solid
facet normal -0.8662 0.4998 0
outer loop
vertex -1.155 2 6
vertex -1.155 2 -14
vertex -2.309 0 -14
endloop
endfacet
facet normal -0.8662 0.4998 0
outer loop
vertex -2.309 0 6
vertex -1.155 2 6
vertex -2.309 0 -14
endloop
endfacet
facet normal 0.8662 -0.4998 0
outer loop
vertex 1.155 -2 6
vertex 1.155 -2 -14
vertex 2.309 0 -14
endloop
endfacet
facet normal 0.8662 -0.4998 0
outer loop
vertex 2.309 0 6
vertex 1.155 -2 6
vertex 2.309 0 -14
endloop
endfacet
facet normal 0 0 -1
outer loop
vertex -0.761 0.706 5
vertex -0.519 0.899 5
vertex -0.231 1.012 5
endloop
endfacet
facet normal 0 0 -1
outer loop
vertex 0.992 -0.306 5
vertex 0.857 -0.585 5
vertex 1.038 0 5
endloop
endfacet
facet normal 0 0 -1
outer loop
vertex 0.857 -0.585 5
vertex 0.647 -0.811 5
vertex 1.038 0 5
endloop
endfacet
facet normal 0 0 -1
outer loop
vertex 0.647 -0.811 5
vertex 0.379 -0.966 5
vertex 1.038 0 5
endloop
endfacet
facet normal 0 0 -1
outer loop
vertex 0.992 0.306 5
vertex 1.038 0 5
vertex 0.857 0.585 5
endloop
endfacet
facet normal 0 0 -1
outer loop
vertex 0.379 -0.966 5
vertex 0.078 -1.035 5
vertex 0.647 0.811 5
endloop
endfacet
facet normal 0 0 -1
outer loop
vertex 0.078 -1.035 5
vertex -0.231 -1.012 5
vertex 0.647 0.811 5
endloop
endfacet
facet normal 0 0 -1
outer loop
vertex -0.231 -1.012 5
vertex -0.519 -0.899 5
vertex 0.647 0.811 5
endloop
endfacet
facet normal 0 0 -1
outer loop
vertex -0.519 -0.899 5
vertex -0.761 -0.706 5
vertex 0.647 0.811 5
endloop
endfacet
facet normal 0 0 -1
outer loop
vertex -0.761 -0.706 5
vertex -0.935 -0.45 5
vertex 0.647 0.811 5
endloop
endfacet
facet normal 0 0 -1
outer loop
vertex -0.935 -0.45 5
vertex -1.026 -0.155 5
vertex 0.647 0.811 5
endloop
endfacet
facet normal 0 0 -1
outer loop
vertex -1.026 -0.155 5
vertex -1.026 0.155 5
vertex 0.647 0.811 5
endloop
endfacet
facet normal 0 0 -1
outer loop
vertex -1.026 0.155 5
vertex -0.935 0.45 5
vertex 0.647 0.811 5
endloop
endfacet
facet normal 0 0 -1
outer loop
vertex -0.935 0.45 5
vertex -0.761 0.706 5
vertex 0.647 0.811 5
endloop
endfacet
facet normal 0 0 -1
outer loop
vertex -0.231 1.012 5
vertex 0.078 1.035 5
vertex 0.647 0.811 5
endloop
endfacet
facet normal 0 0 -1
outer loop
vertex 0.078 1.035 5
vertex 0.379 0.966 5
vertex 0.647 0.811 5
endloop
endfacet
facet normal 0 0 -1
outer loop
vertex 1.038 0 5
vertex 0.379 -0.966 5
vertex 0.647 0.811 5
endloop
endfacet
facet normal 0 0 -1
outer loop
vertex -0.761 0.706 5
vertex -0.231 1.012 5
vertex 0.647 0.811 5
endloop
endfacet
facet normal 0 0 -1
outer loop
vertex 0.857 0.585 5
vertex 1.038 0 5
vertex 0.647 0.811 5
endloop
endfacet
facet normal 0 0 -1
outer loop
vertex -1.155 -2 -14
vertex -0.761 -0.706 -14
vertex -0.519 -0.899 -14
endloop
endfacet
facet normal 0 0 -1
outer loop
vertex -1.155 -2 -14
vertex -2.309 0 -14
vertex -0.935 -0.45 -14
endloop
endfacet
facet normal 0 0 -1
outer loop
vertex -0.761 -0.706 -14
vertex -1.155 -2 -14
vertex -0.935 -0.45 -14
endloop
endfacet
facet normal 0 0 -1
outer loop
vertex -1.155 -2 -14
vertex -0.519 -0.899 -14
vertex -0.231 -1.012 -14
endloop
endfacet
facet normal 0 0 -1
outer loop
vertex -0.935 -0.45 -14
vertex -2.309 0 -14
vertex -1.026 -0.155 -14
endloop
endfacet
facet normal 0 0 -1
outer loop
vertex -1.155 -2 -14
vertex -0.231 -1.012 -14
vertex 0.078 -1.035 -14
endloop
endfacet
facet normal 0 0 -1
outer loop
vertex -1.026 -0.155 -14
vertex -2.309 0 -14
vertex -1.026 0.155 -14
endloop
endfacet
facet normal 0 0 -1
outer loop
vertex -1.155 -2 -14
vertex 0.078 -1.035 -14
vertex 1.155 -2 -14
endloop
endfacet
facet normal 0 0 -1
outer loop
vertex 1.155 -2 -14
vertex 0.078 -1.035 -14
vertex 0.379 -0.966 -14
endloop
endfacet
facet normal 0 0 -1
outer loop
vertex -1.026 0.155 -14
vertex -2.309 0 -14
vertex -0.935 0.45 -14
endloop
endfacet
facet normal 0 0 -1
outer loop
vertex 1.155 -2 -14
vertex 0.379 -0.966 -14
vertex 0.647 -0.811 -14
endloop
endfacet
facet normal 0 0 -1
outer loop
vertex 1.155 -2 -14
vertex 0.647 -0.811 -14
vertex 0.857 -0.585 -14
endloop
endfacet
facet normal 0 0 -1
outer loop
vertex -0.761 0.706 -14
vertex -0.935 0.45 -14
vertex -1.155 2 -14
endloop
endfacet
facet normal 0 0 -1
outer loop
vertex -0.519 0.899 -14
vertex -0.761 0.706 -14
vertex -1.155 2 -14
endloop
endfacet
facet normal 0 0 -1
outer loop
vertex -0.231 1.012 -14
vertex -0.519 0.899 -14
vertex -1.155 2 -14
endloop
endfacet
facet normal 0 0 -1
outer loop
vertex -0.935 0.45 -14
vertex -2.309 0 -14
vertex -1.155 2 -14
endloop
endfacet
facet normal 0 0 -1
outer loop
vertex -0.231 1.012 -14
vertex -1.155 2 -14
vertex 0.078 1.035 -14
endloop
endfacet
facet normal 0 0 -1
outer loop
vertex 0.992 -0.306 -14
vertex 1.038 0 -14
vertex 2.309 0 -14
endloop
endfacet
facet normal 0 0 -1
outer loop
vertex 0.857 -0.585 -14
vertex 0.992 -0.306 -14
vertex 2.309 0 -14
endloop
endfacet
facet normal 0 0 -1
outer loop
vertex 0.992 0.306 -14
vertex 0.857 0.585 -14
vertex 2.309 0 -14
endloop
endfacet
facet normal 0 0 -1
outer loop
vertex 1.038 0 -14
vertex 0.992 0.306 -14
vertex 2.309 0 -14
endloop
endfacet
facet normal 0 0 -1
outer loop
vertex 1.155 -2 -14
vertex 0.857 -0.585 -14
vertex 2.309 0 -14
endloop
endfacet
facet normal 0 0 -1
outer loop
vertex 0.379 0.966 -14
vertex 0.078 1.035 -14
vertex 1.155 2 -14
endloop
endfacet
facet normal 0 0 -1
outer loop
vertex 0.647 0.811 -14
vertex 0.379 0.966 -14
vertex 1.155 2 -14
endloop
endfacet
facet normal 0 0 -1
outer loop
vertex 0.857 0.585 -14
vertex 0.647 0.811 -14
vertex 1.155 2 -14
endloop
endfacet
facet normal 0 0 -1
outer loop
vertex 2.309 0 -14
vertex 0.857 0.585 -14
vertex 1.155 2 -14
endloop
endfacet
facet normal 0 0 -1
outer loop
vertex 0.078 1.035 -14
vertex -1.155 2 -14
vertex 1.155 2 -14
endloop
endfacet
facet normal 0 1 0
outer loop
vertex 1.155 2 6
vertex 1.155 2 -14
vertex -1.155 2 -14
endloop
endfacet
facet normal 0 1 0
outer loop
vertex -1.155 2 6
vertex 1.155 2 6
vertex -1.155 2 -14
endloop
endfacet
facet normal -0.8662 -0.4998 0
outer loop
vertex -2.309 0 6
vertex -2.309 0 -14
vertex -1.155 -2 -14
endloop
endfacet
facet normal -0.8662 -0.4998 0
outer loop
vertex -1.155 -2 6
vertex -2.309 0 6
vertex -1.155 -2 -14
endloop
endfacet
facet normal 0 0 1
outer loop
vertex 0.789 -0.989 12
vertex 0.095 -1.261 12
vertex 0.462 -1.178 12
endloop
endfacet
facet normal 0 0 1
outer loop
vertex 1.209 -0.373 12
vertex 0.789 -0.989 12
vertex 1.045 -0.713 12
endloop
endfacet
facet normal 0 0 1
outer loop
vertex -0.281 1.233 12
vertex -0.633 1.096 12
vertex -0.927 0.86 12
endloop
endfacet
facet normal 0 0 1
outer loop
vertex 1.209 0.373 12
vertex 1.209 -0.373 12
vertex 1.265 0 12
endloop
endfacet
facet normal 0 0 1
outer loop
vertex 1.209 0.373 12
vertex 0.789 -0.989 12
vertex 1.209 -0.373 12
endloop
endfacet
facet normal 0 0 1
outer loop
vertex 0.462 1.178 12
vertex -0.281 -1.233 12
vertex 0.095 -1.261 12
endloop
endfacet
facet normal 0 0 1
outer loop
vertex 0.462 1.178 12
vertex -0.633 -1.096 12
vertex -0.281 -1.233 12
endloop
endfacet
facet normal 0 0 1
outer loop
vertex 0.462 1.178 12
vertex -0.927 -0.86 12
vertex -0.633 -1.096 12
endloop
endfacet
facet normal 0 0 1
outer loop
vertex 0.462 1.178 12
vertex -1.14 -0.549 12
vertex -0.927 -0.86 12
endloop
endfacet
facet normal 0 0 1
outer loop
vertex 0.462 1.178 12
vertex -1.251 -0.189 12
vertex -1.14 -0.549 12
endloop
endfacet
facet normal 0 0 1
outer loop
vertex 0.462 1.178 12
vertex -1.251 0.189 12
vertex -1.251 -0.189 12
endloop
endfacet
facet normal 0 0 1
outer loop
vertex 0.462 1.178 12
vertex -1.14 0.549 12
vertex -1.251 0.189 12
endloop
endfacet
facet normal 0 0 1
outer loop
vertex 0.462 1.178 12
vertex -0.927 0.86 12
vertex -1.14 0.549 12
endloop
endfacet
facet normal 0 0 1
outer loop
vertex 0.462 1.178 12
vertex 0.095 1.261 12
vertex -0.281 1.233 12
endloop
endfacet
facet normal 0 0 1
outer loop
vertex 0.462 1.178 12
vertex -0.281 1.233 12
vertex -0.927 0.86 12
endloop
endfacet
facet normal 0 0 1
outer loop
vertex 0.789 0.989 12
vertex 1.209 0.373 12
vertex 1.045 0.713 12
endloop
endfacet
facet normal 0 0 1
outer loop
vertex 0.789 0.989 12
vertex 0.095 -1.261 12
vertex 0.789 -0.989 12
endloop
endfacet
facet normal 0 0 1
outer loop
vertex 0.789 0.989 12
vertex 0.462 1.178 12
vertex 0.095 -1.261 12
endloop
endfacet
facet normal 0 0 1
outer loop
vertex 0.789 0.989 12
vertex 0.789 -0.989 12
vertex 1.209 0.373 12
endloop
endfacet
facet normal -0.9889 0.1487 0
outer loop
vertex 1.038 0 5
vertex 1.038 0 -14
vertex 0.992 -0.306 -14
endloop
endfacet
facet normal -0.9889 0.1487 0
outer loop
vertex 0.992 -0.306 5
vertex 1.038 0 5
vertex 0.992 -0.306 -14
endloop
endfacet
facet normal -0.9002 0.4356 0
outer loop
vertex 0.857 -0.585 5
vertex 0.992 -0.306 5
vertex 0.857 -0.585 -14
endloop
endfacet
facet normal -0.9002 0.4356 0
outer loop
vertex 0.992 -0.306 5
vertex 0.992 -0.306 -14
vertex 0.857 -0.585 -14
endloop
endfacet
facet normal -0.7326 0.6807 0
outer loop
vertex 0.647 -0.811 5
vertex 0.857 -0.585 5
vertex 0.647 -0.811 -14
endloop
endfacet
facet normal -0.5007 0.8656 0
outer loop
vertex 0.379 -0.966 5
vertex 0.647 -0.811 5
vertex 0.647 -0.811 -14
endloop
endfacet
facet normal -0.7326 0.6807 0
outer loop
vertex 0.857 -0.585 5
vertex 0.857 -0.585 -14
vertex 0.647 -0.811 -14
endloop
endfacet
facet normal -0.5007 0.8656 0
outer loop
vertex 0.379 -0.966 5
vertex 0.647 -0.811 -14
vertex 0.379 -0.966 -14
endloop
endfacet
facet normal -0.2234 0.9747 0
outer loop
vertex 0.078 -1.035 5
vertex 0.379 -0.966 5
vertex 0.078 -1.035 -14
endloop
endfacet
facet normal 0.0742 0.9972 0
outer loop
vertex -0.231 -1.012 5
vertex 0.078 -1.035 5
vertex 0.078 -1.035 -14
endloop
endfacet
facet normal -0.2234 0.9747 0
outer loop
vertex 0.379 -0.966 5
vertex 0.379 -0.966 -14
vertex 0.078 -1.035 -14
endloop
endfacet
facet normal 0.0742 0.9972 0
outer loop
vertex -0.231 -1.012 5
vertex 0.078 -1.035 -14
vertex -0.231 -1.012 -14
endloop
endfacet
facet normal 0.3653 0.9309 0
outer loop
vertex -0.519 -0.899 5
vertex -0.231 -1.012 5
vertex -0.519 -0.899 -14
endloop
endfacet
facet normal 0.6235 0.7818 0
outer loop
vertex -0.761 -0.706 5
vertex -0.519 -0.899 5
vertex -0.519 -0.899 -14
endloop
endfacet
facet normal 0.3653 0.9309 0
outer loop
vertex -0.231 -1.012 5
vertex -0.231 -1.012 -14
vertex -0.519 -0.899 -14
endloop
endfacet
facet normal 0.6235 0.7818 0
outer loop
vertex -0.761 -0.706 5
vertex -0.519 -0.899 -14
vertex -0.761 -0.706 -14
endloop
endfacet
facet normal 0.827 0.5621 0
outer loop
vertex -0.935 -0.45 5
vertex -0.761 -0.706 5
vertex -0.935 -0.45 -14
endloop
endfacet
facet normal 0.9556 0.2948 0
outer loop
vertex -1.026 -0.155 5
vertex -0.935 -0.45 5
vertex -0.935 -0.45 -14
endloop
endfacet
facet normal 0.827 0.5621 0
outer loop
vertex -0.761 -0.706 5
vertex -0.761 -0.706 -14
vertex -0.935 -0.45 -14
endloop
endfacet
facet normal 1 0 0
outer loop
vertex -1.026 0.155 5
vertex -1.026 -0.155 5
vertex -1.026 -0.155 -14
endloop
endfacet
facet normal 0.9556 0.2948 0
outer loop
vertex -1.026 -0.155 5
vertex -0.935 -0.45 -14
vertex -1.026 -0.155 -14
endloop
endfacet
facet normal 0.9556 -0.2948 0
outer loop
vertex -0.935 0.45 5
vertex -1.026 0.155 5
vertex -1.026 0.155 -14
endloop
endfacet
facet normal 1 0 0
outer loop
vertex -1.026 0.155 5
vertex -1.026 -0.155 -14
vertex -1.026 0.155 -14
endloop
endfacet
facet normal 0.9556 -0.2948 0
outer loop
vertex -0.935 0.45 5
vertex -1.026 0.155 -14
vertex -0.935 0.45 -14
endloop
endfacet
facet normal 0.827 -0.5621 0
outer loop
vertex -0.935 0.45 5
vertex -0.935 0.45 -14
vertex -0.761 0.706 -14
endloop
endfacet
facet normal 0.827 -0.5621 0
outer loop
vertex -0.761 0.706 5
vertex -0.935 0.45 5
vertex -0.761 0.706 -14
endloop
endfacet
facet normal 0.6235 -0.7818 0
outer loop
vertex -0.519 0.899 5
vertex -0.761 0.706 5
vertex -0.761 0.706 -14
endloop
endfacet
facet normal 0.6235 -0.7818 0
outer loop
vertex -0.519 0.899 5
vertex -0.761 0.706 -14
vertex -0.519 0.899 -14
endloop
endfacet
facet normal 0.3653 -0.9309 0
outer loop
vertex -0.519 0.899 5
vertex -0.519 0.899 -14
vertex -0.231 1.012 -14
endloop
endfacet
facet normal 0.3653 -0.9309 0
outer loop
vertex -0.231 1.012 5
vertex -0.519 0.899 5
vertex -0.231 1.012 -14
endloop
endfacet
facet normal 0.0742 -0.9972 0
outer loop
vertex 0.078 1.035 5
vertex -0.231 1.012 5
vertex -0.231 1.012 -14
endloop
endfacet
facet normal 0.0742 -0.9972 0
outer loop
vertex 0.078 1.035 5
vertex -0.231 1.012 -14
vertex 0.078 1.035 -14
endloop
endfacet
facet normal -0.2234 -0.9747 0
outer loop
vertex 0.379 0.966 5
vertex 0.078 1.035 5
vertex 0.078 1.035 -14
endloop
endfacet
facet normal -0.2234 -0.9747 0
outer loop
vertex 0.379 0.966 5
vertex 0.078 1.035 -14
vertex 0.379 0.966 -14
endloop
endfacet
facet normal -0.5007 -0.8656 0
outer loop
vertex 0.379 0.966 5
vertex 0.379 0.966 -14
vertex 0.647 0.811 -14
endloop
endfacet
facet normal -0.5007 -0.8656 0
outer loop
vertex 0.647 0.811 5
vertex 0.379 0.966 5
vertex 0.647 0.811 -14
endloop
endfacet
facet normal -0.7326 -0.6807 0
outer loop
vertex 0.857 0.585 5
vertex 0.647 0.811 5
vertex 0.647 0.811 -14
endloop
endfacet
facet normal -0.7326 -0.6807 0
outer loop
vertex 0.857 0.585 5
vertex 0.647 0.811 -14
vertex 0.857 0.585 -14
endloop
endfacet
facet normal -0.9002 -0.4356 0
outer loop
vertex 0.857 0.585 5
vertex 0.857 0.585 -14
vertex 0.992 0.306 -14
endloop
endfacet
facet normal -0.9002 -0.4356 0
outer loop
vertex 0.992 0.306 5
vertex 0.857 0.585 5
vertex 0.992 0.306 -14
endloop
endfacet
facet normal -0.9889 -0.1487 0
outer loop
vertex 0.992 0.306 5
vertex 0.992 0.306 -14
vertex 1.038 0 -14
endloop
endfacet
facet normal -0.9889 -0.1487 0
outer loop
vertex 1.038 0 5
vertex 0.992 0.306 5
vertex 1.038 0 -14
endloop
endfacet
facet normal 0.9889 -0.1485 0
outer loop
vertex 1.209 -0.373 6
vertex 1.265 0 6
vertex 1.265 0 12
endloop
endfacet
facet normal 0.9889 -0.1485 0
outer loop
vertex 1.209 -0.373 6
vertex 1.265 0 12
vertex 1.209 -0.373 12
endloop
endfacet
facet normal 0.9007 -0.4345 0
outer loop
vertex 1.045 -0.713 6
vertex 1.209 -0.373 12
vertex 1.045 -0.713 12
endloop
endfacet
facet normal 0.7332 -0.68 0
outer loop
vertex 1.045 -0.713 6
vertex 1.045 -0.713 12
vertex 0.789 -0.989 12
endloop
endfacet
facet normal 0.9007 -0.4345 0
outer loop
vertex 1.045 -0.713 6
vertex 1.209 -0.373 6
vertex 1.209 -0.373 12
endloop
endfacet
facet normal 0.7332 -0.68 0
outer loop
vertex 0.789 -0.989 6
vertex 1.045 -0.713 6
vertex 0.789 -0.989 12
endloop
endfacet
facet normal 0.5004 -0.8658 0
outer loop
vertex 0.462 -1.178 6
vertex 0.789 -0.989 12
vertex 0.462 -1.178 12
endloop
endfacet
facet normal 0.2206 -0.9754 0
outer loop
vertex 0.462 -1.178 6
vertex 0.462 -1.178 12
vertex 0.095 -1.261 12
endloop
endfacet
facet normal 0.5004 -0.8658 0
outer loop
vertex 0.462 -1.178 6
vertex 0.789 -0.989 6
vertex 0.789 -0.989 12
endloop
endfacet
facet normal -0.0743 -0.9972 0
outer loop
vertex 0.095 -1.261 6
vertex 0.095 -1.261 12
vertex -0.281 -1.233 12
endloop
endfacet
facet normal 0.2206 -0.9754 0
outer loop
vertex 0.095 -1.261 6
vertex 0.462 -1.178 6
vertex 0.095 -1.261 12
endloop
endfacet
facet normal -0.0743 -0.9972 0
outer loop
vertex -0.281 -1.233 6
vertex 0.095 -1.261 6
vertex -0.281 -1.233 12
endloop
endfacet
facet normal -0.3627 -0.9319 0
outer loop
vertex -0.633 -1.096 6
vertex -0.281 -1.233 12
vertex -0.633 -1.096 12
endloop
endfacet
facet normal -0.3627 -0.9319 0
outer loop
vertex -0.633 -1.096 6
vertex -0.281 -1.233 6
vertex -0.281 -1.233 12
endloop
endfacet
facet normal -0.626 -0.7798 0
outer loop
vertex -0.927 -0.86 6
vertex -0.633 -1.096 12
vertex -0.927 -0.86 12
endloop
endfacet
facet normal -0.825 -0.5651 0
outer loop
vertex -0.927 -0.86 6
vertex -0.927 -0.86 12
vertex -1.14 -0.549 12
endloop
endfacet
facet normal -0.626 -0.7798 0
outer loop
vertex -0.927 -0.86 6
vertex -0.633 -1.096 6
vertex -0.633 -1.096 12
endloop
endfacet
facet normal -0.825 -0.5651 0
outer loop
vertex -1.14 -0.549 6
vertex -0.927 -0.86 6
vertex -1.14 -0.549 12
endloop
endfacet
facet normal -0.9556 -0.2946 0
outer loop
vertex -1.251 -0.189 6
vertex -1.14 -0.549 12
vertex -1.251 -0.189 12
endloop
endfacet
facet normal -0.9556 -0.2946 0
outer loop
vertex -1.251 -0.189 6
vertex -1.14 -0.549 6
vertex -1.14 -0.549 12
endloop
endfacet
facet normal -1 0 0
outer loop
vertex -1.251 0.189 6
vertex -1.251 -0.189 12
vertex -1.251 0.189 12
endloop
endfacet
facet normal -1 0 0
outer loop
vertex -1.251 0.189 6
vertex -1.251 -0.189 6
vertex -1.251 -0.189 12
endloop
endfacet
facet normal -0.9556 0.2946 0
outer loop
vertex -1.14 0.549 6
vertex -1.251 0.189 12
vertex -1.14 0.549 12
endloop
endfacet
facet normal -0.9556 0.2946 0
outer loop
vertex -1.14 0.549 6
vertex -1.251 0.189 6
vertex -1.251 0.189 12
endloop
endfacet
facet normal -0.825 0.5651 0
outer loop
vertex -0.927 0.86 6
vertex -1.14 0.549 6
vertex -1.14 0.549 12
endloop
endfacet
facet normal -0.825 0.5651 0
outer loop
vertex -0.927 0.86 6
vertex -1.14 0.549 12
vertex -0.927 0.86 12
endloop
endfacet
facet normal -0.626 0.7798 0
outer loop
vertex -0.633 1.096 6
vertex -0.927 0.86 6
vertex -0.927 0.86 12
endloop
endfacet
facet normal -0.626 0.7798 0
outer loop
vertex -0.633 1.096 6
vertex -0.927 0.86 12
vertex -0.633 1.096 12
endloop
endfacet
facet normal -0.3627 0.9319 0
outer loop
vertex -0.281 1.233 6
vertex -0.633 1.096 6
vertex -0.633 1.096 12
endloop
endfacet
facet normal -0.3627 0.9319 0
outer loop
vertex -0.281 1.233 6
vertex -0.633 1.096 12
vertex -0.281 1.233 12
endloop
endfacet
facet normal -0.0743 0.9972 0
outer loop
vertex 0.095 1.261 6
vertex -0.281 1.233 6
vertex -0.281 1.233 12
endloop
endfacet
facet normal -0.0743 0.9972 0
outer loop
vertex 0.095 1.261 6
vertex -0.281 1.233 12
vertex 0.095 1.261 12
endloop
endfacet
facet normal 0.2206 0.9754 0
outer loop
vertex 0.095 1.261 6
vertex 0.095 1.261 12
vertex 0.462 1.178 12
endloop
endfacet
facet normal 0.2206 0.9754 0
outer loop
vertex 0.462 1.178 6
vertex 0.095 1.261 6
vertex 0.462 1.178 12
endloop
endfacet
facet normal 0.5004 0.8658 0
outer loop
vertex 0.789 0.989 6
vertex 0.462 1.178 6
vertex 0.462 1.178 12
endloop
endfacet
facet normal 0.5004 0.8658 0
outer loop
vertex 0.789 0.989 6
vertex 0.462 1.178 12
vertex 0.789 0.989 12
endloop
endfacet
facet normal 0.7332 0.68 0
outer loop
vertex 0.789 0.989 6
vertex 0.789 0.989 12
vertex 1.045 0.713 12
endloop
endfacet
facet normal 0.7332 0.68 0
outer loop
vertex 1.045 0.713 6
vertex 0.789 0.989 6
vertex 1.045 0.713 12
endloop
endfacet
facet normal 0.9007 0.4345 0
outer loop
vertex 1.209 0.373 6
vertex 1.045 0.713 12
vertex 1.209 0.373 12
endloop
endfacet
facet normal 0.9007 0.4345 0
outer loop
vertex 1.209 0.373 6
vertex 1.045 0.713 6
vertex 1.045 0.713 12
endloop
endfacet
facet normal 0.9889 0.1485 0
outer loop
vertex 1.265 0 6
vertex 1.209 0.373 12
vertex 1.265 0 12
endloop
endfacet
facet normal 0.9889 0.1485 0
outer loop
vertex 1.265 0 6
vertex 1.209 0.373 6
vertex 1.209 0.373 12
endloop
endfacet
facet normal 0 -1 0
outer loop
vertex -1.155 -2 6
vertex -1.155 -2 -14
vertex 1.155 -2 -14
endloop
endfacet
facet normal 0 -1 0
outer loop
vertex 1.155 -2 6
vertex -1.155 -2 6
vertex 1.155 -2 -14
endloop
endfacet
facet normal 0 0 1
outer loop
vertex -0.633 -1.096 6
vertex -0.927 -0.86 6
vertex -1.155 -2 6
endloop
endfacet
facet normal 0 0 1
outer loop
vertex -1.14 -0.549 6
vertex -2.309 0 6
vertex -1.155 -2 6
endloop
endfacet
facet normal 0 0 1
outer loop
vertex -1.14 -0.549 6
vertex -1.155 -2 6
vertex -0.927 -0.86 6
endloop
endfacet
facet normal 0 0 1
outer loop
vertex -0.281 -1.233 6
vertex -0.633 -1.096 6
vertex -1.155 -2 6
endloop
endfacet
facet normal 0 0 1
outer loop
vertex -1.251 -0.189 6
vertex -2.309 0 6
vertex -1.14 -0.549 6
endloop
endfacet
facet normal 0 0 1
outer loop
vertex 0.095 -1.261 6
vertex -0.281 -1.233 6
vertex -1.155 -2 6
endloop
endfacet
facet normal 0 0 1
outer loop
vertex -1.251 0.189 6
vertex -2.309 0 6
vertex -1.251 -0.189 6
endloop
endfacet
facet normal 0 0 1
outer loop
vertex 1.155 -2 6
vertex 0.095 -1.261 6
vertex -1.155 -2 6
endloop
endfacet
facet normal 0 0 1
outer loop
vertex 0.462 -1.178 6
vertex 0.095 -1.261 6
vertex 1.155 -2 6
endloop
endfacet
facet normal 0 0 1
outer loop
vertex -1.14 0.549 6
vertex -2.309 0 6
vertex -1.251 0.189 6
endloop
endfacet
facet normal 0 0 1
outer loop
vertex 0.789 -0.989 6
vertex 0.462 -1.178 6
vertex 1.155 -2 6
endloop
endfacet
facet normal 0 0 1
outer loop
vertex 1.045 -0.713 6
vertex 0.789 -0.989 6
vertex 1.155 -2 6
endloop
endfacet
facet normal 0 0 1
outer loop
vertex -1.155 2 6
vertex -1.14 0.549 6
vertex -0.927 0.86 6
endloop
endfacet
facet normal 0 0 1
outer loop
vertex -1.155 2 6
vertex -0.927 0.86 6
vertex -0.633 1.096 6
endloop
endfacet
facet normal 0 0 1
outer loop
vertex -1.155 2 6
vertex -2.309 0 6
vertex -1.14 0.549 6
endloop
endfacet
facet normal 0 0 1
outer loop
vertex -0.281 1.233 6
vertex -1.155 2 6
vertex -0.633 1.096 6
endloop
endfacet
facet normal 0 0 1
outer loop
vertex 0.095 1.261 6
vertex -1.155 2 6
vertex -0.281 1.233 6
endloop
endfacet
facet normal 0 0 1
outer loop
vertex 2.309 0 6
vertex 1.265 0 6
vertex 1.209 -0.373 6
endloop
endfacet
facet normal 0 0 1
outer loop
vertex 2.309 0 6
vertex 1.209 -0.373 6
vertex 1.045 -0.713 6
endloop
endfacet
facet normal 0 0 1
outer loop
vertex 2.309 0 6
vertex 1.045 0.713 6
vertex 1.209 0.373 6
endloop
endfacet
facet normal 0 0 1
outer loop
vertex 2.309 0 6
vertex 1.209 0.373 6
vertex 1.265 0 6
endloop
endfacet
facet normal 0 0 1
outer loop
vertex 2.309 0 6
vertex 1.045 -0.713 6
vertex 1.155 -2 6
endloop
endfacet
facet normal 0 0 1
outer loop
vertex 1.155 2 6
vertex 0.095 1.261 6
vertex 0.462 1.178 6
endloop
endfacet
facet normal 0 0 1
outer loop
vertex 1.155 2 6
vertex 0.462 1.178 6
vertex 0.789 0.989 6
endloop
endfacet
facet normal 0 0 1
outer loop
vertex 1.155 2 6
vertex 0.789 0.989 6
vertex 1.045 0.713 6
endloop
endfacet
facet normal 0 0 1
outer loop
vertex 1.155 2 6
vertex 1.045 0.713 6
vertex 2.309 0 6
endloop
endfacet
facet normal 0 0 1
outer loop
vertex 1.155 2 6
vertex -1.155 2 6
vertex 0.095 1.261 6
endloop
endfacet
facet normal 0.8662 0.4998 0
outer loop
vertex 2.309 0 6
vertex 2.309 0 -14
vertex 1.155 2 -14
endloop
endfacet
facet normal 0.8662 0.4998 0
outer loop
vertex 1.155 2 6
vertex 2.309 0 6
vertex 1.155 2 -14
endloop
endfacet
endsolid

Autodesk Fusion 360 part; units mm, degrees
sketch "Sketch1" plane through (0, 0, 0) normal (0, 0, 1) x (1, 0, 0)
  circle A0 centre (0, 0) radius 1.25
  line L0 (2.3094, 0) -> (1.1547, 2)
  line L1 (1.1547, 2) -> (-1.1547, 2)
  line L2 (-1.1547, 2) -> (-2.3094, 0)
  line L3 (-2.3094, 0) -> (-1.1547, -2)
  line L4 (-1.1547, -2) -> (1.1547, -2)
  line L5 (1.1547, -2) -> (2.3094, 0)
  dimension "d1" = 2.5
  dimension "d21" = 2
extrude "Extrude6" add sketch "Sketch1" along normal blind 6
extrude "Extrude7" add sketch "Sketch1" along normal blind 7 from surface at 5 contours A0
thread "Thread1" "ISO Metric profile 2.6 M2.6x0.45 M2.6x0.45 6g" major diameter 2.53 minor diameter 2.0162 pitch 0.45 angle 60 resizes the face on face at (1.2438, -0.1245, 8)
thread "Thread2" "ISO Metric profile 2.5 M2.5x0.45 M2.5x0.45 6H" major diameter 2.58 minor diameter 2.0755 pitch 0.45 angle 60 resizes the face on face at (1.2484, 0.0623, 1.6667)
move_face "OffsetFaces2" offset 14 1 faces at (-1.4664, 0.8168, 0)
equation "d31 = 1.3 mm + 24 mm - 7.3 mm - 4 mm"
